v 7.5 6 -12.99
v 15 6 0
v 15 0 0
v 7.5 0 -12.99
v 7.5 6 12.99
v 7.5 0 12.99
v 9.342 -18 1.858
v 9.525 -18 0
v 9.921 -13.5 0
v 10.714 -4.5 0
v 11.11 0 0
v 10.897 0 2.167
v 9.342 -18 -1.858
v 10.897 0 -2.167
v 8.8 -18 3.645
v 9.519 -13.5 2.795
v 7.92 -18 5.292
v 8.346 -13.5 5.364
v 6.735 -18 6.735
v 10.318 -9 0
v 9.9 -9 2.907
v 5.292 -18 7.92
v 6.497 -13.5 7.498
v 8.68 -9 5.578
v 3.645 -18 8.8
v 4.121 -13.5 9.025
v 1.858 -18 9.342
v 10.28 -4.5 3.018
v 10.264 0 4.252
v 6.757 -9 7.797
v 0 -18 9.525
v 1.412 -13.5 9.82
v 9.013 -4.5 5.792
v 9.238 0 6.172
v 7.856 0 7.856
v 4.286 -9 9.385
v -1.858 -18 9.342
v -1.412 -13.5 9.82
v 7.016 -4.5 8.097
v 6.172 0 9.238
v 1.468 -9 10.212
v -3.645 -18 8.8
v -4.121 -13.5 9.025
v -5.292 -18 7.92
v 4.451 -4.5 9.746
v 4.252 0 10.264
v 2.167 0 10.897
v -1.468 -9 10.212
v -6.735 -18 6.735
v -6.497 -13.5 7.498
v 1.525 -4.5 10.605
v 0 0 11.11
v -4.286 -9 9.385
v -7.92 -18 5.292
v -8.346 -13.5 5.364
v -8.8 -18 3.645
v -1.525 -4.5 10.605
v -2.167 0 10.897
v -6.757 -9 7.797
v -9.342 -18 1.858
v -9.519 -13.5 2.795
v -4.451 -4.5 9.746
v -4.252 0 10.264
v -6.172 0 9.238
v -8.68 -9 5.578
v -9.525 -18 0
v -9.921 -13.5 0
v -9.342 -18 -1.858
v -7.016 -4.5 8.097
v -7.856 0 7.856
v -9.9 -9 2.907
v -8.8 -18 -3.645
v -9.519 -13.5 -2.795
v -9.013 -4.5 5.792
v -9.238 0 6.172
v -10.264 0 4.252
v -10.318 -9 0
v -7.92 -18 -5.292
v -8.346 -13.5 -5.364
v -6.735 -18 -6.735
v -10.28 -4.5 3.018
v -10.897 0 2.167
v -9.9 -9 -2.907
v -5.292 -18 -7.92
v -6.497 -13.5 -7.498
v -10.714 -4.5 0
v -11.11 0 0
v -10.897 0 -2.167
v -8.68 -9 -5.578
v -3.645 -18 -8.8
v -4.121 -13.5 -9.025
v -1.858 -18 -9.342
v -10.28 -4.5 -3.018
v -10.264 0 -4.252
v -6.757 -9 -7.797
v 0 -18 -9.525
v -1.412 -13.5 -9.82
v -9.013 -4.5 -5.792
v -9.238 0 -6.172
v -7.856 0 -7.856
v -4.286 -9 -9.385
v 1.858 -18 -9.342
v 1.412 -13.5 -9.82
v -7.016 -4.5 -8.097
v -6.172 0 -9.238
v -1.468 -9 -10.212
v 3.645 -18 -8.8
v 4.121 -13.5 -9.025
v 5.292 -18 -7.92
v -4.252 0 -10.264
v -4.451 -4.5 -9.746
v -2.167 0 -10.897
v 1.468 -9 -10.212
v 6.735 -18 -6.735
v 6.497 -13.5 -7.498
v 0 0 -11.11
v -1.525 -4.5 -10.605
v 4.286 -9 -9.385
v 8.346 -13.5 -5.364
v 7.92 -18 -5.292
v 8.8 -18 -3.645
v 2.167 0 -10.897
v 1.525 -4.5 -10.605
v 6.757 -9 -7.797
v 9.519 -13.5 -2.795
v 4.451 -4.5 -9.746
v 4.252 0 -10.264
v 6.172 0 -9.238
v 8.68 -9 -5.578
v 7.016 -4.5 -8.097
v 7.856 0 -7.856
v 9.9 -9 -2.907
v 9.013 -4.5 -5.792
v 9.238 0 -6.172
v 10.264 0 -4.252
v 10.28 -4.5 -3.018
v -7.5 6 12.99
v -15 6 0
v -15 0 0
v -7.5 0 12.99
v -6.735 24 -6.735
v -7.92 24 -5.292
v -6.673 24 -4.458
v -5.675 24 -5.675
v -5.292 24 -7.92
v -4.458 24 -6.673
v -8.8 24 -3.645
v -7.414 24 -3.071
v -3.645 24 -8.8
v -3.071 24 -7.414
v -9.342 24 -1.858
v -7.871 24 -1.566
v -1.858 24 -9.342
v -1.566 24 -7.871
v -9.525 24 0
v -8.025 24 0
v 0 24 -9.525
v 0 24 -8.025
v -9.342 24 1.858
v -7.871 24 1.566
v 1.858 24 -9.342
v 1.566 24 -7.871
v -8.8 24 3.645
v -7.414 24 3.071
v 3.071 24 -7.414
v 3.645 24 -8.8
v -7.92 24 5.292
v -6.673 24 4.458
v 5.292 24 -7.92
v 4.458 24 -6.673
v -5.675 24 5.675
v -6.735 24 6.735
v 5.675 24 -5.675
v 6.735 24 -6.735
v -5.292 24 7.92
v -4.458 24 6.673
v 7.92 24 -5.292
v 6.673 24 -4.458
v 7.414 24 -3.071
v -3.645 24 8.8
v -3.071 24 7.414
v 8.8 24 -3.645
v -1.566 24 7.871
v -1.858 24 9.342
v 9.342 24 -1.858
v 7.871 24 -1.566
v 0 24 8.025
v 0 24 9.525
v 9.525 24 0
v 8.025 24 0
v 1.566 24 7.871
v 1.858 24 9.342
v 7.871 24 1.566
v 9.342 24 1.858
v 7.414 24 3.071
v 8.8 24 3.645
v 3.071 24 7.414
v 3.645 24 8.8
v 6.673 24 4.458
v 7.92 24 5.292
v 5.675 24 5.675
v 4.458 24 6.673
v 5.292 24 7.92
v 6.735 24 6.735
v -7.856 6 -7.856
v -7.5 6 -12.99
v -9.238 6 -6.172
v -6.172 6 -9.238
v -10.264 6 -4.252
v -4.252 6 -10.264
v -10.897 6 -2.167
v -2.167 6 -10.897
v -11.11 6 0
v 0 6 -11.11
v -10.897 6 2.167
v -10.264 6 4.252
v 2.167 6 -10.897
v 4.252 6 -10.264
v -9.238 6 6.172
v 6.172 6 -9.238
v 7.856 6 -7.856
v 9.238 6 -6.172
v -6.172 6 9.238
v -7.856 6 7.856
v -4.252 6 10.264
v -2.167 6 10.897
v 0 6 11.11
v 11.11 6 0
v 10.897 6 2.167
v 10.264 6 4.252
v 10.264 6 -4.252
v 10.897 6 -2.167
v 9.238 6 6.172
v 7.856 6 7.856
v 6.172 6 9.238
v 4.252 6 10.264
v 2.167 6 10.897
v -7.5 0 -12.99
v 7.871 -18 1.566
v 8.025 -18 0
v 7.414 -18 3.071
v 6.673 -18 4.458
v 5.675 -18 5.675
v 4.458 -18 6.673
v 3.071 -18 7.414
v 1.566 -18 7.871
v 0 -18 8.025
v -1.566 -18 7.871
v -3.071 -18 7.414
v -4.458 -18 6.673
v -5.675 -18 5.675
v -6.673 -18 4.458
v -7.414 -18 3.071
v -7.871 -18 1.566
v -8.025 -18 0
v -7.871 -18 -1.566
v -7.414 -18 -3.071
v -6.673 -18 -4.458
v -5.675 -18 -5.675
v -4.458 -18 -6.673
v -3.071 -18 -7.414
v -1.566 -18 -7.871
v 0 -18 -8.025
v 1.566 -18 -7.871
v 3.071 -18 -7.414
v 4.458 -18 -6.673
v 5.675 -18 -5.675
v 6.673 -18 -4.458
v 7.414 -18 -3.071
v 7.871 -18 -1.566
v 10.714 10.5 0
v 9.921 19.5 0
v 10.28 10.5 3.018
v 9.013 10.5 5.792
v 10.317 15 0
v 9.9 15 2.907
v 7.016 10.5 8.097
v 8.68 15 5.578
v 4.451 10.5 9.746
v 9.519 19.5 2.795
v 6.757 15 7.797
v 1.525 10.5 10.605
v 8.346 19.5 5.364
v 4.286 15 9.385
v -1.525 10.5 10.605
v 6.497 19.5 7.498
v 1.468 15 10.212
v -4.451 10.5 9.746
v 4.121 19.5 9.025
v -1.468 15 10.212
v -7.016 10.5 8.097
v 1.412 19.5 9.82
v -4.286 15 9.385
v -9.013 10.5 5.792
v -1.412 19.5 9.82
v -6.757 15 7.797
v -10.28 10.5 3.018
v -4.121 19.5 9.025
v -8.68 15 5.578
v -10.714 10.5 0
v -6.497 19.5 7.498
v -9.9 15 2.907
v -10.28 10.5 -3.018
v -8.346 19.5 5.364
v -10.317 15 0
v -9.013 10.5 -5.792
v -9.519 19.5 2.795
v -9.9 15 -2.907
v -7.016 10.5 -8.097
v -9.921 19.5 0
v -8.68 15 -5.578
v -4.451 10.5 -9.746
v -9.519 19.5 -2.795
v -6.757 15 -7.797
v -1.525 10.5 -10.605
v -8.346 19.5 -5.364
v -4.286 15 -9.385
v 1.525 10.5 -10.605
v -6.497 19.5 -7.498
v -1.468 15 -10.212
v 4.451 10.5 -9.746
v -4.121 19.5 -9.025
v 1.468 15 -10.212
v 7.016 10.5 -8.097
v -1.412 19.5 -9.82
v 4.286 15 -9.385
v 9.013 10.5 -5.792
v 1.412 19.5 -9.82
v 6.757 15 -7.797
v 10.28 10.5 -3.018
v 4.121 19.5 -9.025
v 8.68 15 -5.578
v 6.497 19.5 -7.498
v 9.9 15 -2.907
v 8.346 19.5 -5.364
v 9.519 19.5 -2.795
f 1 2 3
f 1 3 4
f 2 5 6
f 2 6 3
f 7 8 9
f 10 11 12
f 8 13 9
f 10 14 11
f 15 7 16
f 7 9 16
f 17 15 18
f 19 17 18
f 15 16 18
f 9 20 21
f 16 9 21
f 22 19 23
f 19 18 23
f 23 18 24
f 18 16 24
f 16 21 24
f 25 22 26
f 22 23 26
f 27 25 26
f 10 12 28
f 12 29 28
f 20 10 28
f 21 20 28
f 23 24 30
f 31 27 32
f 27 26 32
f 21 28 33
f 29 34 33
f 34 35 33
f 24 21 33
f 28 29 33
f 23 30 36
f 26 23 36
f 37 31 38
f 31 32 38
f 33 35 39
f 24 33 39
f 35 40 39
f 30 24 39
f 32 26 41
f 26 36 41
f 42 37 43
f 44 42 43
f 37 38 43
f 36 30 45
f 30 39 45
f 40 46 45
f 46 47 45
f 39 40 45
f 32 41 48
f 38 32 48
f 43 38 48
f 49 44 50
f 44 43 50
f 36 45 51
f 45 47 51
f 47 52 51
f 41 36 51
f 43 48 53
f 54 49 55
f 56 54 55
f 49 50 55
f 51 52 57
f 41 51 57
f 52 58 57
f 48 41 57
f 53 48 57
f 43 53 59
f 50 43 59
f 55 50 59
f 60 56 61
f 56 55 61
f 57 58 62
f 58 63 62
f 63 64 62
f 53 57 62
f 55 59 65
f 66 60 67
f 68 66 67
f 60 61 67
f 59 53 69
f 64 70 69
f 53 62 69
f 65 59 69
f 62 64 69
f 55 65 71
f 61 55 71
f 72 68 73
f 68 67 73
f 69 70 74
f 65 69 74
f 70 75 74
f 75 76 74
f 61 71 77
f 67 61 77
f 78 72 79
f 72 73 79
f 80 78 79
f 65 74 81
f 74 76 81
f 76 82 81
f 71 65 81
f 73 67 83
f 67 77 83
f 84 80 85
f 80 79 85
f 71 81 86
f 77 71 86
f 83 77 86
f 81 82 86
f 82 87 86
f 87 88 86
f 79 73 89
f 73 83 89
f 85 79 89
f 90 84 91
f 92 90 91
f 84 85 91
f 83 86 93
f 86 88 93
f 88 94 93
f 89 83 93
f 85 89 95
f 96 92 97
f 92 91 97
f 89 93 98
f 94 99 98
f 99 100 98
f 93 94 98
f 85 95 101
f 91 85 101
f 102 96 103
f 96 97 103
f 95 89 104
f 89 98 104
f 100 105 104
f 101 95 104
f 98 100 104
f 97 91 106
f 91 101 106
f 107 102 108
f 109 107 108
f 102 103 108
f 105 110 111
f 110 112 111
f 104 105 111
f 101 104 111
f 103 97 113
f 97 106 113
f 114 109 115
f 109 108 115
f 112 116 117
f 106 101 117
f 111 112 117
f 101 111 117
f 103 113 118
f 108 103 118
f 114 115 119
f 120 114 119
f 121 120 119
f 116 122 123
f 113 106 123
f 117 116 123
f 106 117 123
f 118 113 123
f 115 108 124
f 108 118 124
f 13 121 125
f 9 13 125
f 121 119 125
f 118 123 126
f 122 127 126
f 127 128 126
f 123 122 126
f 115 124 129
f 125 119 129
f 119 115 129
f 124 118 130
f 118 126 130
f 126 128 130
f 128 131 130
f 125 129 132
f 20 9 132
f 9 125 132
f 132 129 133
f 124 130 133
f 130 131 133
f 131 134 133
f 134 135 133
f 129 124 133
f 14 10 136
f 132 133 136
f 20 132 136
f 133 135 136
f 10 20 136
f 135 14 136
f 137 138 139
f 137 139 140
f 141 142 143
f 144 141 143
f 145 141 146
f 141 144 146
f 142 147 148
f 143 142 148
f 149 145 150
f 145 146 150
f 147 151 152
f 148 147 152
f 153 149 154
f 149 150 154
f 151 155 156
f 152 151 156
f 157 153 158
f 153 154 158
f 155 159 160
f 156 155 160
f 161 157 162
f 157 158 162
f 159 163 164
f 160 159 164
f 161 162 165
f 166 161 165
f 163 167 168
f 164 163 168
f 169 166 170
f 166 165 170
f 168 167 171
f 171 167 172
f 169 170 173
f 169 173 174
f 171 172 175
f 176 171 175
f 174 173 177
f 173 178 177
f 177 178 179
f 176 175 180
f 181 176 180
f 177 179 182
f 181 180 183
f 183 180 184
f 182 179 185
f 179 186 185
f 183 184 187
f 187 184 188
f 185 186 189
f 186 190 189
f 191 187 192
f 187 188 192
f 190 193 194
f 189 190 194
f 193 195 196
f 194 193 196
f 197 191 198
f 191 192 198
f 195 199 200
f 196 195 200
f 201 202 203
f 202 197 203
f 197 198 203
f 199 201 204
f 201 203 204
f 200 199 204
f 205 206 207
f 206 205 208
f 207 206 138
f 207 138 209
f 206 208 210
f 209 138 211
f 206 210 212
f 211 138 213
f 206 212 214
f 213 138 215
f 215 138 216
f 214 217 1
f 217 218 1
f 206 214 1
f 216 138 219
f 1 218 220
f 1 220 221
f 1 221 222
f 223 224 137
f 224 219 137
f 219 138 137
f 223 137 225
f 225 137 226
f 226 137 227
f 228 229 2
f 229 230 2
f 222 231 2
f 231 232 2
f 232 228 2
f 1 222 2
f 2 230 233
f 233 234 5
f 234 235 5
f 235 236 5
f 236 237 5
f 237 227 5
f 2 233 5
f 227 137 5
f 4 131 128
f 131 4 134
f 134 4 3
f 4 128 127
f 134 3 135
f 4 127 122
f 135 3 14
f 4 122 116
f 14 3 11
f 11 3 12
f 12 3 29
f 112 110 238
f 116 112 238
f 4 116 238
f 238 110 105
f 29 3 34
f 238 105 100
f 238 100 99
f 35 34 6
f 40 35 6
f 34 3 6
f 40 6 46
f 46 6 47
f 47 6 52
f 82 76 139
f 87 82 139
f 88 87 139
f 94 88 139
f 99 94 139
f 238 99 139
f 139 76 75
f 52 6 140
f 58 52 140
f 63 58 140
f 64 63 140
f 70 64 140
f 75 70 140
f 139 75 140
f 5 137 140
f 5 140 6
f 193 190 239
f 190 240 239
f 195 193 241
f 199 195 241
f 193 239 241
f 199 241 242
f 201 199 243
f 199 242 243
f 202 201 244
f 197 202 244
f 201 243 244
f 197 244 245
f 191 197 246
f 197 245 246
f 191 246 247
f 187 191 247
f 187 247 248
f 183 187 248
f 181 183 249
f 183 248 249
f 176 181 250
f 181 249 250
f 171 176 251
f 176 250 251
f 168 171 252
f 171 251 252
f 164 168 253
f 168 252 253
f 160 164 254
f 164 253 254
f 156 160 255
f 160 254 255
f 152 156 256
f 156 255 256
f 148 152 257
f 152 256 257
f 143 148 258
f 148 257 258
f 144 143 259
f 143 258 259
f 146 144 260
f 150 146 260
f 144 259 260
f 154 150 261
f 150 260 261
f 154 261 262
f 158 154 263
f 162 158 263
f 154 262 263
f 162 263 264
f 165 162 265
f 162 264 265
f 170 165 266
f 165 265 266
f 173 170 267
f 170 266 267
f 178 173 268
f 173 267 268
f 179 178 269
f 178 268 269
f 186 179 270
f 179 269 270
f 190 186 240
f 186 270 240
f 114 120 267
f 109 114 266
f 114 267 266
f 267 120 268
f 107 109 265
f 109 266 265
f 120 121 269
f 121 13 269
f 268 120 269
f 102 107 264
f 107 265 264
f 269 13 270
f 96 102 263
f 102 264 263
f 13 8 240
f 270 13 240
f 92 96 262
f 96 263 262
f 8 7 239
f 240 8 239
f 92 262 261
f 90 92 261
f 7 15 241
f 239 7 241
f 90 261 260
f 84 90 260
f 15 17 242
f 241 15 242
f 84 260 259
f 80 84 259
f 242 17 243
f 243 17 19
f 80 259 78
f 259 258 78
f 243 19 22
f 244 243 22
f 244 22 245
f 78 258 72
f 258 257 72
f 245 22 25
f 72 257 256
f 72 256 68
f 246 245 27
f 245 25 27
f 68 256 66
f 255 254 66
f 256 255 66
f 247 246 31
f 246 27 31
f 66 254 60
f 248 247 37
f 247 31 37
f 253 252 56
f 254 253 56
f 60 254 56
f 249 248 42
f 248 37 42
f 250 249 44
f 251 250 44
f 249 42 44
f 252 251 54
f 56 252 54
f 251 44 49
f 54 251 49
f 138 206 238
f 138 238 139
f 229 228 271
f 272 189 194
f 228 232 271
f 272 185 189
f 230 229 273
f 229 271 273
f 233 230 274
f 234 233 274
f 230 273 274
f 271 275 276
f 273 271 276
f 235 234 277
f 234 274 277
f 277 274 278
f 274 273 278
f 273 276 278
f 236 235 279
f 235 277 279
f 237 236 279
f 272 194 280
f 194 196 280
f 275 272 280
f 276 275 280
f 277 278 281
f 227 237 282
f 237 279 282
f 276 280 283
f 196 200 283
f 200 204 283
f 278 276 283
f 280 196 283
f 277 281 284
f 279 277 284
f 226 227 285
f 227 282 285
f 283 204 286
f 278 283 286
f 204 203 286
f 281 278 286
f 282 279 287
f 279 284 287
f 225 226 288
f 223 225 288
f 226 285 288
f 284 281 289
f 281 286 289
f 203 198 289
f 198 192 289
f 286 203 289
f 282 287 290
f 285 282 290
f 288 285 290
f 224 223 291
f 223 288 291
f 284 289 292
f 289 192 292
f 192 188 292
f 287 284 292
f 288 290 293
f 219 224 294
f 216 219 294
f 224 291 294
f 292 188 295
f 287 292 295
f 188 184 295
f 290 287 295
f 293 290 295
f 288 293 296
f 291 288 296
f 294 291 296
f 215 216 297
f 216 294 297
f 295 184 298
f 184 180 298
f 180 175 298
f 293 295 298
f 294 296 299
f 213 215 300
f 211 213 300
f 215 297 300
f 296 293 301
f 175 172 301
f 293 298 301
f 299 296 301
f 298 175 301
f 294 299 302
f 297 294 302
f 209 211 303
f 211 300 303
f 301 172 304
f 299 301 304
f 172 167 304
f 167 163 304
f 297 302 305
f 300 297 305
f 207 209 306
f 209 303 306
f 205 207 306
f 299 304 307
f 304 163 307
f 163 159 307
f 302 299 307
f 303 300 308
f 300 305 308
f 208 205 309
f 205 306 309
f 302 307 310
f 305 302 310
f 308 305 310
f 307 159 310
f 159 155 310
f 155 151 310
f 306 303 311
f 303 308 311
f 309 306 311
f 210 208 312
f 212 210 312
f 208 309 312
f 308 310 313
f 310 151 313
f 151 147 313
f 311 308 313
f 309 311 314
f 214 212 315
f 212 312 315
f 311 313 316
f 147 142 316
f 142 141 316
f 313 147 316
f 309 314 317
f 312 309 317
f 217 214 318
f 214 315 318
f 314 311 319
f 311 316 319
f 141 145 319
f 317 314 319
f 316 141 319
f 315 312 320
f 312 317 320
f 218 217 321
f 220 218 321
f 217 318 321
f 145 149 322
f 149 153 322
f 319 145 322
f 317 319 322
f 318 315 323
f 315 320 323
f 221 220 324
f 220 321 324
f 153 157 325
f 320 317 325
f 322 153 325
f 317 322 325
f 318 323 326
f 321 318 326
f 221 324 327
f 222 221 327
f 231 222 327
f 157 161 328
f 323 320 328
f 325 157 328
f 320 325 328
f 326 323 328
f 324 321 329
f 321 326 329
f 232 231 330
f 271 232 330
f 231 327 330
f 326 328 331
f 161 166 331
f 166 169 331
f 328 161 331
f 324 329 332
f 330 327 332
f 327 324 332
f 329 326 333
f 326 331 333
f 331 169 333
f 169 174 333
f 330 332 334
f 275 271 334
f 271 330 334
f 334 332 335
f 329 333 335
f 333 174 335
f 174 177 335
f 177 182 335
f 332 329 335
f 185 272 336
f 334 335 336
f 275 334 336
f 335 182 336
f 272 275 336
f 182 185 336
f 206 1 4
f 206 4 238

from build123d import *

# Parameters (mm, degrees)
CROQUIS2_OUTSIDE_W    = 43.94
CROQUIS2_OUTSIDE_H    = 43.94
CORTAR_EXTRUIR1_DEPTH = 25


with BuildPart() as part:
    # Croquis1 → Revolución1 (revolve)
    with BuildSketch(Plane.XY):
        Polygon((8.025, 24), (8.025, -18), (9.525, -18), (11.11, 0), (15, 0), (15, 6), (11.11, 6), (9.525, 24), align=None)
    revolve(axis=Axis((0, 30.334405112, 0), (0, -1, 0)))

    # Croquis2 outside → Cortar-Extruir1 (cut, through all)
    with BuildSketch(Plane(origin=(0, 6, 0), x_dir=(1, 0, 0), z_dir=(0, 1, 0))):
        Rectangle(CROQUIS2_OUTSIDE_W, CROQUIS2_OUTSIDE_H)
        Polygon((15, 0), (7.5, 12.990381057), (-7.5, 12.990381057), (-15, 0), (-7.5, -12.990381057), (7.5, -12.990381057), align=None, mode=Mode.SUBTRACT)
    extrude(amount=-CORTAR_EXTRUIR1_DEPTH, mode=Mode.SUBTRACT)


solid = part.part
